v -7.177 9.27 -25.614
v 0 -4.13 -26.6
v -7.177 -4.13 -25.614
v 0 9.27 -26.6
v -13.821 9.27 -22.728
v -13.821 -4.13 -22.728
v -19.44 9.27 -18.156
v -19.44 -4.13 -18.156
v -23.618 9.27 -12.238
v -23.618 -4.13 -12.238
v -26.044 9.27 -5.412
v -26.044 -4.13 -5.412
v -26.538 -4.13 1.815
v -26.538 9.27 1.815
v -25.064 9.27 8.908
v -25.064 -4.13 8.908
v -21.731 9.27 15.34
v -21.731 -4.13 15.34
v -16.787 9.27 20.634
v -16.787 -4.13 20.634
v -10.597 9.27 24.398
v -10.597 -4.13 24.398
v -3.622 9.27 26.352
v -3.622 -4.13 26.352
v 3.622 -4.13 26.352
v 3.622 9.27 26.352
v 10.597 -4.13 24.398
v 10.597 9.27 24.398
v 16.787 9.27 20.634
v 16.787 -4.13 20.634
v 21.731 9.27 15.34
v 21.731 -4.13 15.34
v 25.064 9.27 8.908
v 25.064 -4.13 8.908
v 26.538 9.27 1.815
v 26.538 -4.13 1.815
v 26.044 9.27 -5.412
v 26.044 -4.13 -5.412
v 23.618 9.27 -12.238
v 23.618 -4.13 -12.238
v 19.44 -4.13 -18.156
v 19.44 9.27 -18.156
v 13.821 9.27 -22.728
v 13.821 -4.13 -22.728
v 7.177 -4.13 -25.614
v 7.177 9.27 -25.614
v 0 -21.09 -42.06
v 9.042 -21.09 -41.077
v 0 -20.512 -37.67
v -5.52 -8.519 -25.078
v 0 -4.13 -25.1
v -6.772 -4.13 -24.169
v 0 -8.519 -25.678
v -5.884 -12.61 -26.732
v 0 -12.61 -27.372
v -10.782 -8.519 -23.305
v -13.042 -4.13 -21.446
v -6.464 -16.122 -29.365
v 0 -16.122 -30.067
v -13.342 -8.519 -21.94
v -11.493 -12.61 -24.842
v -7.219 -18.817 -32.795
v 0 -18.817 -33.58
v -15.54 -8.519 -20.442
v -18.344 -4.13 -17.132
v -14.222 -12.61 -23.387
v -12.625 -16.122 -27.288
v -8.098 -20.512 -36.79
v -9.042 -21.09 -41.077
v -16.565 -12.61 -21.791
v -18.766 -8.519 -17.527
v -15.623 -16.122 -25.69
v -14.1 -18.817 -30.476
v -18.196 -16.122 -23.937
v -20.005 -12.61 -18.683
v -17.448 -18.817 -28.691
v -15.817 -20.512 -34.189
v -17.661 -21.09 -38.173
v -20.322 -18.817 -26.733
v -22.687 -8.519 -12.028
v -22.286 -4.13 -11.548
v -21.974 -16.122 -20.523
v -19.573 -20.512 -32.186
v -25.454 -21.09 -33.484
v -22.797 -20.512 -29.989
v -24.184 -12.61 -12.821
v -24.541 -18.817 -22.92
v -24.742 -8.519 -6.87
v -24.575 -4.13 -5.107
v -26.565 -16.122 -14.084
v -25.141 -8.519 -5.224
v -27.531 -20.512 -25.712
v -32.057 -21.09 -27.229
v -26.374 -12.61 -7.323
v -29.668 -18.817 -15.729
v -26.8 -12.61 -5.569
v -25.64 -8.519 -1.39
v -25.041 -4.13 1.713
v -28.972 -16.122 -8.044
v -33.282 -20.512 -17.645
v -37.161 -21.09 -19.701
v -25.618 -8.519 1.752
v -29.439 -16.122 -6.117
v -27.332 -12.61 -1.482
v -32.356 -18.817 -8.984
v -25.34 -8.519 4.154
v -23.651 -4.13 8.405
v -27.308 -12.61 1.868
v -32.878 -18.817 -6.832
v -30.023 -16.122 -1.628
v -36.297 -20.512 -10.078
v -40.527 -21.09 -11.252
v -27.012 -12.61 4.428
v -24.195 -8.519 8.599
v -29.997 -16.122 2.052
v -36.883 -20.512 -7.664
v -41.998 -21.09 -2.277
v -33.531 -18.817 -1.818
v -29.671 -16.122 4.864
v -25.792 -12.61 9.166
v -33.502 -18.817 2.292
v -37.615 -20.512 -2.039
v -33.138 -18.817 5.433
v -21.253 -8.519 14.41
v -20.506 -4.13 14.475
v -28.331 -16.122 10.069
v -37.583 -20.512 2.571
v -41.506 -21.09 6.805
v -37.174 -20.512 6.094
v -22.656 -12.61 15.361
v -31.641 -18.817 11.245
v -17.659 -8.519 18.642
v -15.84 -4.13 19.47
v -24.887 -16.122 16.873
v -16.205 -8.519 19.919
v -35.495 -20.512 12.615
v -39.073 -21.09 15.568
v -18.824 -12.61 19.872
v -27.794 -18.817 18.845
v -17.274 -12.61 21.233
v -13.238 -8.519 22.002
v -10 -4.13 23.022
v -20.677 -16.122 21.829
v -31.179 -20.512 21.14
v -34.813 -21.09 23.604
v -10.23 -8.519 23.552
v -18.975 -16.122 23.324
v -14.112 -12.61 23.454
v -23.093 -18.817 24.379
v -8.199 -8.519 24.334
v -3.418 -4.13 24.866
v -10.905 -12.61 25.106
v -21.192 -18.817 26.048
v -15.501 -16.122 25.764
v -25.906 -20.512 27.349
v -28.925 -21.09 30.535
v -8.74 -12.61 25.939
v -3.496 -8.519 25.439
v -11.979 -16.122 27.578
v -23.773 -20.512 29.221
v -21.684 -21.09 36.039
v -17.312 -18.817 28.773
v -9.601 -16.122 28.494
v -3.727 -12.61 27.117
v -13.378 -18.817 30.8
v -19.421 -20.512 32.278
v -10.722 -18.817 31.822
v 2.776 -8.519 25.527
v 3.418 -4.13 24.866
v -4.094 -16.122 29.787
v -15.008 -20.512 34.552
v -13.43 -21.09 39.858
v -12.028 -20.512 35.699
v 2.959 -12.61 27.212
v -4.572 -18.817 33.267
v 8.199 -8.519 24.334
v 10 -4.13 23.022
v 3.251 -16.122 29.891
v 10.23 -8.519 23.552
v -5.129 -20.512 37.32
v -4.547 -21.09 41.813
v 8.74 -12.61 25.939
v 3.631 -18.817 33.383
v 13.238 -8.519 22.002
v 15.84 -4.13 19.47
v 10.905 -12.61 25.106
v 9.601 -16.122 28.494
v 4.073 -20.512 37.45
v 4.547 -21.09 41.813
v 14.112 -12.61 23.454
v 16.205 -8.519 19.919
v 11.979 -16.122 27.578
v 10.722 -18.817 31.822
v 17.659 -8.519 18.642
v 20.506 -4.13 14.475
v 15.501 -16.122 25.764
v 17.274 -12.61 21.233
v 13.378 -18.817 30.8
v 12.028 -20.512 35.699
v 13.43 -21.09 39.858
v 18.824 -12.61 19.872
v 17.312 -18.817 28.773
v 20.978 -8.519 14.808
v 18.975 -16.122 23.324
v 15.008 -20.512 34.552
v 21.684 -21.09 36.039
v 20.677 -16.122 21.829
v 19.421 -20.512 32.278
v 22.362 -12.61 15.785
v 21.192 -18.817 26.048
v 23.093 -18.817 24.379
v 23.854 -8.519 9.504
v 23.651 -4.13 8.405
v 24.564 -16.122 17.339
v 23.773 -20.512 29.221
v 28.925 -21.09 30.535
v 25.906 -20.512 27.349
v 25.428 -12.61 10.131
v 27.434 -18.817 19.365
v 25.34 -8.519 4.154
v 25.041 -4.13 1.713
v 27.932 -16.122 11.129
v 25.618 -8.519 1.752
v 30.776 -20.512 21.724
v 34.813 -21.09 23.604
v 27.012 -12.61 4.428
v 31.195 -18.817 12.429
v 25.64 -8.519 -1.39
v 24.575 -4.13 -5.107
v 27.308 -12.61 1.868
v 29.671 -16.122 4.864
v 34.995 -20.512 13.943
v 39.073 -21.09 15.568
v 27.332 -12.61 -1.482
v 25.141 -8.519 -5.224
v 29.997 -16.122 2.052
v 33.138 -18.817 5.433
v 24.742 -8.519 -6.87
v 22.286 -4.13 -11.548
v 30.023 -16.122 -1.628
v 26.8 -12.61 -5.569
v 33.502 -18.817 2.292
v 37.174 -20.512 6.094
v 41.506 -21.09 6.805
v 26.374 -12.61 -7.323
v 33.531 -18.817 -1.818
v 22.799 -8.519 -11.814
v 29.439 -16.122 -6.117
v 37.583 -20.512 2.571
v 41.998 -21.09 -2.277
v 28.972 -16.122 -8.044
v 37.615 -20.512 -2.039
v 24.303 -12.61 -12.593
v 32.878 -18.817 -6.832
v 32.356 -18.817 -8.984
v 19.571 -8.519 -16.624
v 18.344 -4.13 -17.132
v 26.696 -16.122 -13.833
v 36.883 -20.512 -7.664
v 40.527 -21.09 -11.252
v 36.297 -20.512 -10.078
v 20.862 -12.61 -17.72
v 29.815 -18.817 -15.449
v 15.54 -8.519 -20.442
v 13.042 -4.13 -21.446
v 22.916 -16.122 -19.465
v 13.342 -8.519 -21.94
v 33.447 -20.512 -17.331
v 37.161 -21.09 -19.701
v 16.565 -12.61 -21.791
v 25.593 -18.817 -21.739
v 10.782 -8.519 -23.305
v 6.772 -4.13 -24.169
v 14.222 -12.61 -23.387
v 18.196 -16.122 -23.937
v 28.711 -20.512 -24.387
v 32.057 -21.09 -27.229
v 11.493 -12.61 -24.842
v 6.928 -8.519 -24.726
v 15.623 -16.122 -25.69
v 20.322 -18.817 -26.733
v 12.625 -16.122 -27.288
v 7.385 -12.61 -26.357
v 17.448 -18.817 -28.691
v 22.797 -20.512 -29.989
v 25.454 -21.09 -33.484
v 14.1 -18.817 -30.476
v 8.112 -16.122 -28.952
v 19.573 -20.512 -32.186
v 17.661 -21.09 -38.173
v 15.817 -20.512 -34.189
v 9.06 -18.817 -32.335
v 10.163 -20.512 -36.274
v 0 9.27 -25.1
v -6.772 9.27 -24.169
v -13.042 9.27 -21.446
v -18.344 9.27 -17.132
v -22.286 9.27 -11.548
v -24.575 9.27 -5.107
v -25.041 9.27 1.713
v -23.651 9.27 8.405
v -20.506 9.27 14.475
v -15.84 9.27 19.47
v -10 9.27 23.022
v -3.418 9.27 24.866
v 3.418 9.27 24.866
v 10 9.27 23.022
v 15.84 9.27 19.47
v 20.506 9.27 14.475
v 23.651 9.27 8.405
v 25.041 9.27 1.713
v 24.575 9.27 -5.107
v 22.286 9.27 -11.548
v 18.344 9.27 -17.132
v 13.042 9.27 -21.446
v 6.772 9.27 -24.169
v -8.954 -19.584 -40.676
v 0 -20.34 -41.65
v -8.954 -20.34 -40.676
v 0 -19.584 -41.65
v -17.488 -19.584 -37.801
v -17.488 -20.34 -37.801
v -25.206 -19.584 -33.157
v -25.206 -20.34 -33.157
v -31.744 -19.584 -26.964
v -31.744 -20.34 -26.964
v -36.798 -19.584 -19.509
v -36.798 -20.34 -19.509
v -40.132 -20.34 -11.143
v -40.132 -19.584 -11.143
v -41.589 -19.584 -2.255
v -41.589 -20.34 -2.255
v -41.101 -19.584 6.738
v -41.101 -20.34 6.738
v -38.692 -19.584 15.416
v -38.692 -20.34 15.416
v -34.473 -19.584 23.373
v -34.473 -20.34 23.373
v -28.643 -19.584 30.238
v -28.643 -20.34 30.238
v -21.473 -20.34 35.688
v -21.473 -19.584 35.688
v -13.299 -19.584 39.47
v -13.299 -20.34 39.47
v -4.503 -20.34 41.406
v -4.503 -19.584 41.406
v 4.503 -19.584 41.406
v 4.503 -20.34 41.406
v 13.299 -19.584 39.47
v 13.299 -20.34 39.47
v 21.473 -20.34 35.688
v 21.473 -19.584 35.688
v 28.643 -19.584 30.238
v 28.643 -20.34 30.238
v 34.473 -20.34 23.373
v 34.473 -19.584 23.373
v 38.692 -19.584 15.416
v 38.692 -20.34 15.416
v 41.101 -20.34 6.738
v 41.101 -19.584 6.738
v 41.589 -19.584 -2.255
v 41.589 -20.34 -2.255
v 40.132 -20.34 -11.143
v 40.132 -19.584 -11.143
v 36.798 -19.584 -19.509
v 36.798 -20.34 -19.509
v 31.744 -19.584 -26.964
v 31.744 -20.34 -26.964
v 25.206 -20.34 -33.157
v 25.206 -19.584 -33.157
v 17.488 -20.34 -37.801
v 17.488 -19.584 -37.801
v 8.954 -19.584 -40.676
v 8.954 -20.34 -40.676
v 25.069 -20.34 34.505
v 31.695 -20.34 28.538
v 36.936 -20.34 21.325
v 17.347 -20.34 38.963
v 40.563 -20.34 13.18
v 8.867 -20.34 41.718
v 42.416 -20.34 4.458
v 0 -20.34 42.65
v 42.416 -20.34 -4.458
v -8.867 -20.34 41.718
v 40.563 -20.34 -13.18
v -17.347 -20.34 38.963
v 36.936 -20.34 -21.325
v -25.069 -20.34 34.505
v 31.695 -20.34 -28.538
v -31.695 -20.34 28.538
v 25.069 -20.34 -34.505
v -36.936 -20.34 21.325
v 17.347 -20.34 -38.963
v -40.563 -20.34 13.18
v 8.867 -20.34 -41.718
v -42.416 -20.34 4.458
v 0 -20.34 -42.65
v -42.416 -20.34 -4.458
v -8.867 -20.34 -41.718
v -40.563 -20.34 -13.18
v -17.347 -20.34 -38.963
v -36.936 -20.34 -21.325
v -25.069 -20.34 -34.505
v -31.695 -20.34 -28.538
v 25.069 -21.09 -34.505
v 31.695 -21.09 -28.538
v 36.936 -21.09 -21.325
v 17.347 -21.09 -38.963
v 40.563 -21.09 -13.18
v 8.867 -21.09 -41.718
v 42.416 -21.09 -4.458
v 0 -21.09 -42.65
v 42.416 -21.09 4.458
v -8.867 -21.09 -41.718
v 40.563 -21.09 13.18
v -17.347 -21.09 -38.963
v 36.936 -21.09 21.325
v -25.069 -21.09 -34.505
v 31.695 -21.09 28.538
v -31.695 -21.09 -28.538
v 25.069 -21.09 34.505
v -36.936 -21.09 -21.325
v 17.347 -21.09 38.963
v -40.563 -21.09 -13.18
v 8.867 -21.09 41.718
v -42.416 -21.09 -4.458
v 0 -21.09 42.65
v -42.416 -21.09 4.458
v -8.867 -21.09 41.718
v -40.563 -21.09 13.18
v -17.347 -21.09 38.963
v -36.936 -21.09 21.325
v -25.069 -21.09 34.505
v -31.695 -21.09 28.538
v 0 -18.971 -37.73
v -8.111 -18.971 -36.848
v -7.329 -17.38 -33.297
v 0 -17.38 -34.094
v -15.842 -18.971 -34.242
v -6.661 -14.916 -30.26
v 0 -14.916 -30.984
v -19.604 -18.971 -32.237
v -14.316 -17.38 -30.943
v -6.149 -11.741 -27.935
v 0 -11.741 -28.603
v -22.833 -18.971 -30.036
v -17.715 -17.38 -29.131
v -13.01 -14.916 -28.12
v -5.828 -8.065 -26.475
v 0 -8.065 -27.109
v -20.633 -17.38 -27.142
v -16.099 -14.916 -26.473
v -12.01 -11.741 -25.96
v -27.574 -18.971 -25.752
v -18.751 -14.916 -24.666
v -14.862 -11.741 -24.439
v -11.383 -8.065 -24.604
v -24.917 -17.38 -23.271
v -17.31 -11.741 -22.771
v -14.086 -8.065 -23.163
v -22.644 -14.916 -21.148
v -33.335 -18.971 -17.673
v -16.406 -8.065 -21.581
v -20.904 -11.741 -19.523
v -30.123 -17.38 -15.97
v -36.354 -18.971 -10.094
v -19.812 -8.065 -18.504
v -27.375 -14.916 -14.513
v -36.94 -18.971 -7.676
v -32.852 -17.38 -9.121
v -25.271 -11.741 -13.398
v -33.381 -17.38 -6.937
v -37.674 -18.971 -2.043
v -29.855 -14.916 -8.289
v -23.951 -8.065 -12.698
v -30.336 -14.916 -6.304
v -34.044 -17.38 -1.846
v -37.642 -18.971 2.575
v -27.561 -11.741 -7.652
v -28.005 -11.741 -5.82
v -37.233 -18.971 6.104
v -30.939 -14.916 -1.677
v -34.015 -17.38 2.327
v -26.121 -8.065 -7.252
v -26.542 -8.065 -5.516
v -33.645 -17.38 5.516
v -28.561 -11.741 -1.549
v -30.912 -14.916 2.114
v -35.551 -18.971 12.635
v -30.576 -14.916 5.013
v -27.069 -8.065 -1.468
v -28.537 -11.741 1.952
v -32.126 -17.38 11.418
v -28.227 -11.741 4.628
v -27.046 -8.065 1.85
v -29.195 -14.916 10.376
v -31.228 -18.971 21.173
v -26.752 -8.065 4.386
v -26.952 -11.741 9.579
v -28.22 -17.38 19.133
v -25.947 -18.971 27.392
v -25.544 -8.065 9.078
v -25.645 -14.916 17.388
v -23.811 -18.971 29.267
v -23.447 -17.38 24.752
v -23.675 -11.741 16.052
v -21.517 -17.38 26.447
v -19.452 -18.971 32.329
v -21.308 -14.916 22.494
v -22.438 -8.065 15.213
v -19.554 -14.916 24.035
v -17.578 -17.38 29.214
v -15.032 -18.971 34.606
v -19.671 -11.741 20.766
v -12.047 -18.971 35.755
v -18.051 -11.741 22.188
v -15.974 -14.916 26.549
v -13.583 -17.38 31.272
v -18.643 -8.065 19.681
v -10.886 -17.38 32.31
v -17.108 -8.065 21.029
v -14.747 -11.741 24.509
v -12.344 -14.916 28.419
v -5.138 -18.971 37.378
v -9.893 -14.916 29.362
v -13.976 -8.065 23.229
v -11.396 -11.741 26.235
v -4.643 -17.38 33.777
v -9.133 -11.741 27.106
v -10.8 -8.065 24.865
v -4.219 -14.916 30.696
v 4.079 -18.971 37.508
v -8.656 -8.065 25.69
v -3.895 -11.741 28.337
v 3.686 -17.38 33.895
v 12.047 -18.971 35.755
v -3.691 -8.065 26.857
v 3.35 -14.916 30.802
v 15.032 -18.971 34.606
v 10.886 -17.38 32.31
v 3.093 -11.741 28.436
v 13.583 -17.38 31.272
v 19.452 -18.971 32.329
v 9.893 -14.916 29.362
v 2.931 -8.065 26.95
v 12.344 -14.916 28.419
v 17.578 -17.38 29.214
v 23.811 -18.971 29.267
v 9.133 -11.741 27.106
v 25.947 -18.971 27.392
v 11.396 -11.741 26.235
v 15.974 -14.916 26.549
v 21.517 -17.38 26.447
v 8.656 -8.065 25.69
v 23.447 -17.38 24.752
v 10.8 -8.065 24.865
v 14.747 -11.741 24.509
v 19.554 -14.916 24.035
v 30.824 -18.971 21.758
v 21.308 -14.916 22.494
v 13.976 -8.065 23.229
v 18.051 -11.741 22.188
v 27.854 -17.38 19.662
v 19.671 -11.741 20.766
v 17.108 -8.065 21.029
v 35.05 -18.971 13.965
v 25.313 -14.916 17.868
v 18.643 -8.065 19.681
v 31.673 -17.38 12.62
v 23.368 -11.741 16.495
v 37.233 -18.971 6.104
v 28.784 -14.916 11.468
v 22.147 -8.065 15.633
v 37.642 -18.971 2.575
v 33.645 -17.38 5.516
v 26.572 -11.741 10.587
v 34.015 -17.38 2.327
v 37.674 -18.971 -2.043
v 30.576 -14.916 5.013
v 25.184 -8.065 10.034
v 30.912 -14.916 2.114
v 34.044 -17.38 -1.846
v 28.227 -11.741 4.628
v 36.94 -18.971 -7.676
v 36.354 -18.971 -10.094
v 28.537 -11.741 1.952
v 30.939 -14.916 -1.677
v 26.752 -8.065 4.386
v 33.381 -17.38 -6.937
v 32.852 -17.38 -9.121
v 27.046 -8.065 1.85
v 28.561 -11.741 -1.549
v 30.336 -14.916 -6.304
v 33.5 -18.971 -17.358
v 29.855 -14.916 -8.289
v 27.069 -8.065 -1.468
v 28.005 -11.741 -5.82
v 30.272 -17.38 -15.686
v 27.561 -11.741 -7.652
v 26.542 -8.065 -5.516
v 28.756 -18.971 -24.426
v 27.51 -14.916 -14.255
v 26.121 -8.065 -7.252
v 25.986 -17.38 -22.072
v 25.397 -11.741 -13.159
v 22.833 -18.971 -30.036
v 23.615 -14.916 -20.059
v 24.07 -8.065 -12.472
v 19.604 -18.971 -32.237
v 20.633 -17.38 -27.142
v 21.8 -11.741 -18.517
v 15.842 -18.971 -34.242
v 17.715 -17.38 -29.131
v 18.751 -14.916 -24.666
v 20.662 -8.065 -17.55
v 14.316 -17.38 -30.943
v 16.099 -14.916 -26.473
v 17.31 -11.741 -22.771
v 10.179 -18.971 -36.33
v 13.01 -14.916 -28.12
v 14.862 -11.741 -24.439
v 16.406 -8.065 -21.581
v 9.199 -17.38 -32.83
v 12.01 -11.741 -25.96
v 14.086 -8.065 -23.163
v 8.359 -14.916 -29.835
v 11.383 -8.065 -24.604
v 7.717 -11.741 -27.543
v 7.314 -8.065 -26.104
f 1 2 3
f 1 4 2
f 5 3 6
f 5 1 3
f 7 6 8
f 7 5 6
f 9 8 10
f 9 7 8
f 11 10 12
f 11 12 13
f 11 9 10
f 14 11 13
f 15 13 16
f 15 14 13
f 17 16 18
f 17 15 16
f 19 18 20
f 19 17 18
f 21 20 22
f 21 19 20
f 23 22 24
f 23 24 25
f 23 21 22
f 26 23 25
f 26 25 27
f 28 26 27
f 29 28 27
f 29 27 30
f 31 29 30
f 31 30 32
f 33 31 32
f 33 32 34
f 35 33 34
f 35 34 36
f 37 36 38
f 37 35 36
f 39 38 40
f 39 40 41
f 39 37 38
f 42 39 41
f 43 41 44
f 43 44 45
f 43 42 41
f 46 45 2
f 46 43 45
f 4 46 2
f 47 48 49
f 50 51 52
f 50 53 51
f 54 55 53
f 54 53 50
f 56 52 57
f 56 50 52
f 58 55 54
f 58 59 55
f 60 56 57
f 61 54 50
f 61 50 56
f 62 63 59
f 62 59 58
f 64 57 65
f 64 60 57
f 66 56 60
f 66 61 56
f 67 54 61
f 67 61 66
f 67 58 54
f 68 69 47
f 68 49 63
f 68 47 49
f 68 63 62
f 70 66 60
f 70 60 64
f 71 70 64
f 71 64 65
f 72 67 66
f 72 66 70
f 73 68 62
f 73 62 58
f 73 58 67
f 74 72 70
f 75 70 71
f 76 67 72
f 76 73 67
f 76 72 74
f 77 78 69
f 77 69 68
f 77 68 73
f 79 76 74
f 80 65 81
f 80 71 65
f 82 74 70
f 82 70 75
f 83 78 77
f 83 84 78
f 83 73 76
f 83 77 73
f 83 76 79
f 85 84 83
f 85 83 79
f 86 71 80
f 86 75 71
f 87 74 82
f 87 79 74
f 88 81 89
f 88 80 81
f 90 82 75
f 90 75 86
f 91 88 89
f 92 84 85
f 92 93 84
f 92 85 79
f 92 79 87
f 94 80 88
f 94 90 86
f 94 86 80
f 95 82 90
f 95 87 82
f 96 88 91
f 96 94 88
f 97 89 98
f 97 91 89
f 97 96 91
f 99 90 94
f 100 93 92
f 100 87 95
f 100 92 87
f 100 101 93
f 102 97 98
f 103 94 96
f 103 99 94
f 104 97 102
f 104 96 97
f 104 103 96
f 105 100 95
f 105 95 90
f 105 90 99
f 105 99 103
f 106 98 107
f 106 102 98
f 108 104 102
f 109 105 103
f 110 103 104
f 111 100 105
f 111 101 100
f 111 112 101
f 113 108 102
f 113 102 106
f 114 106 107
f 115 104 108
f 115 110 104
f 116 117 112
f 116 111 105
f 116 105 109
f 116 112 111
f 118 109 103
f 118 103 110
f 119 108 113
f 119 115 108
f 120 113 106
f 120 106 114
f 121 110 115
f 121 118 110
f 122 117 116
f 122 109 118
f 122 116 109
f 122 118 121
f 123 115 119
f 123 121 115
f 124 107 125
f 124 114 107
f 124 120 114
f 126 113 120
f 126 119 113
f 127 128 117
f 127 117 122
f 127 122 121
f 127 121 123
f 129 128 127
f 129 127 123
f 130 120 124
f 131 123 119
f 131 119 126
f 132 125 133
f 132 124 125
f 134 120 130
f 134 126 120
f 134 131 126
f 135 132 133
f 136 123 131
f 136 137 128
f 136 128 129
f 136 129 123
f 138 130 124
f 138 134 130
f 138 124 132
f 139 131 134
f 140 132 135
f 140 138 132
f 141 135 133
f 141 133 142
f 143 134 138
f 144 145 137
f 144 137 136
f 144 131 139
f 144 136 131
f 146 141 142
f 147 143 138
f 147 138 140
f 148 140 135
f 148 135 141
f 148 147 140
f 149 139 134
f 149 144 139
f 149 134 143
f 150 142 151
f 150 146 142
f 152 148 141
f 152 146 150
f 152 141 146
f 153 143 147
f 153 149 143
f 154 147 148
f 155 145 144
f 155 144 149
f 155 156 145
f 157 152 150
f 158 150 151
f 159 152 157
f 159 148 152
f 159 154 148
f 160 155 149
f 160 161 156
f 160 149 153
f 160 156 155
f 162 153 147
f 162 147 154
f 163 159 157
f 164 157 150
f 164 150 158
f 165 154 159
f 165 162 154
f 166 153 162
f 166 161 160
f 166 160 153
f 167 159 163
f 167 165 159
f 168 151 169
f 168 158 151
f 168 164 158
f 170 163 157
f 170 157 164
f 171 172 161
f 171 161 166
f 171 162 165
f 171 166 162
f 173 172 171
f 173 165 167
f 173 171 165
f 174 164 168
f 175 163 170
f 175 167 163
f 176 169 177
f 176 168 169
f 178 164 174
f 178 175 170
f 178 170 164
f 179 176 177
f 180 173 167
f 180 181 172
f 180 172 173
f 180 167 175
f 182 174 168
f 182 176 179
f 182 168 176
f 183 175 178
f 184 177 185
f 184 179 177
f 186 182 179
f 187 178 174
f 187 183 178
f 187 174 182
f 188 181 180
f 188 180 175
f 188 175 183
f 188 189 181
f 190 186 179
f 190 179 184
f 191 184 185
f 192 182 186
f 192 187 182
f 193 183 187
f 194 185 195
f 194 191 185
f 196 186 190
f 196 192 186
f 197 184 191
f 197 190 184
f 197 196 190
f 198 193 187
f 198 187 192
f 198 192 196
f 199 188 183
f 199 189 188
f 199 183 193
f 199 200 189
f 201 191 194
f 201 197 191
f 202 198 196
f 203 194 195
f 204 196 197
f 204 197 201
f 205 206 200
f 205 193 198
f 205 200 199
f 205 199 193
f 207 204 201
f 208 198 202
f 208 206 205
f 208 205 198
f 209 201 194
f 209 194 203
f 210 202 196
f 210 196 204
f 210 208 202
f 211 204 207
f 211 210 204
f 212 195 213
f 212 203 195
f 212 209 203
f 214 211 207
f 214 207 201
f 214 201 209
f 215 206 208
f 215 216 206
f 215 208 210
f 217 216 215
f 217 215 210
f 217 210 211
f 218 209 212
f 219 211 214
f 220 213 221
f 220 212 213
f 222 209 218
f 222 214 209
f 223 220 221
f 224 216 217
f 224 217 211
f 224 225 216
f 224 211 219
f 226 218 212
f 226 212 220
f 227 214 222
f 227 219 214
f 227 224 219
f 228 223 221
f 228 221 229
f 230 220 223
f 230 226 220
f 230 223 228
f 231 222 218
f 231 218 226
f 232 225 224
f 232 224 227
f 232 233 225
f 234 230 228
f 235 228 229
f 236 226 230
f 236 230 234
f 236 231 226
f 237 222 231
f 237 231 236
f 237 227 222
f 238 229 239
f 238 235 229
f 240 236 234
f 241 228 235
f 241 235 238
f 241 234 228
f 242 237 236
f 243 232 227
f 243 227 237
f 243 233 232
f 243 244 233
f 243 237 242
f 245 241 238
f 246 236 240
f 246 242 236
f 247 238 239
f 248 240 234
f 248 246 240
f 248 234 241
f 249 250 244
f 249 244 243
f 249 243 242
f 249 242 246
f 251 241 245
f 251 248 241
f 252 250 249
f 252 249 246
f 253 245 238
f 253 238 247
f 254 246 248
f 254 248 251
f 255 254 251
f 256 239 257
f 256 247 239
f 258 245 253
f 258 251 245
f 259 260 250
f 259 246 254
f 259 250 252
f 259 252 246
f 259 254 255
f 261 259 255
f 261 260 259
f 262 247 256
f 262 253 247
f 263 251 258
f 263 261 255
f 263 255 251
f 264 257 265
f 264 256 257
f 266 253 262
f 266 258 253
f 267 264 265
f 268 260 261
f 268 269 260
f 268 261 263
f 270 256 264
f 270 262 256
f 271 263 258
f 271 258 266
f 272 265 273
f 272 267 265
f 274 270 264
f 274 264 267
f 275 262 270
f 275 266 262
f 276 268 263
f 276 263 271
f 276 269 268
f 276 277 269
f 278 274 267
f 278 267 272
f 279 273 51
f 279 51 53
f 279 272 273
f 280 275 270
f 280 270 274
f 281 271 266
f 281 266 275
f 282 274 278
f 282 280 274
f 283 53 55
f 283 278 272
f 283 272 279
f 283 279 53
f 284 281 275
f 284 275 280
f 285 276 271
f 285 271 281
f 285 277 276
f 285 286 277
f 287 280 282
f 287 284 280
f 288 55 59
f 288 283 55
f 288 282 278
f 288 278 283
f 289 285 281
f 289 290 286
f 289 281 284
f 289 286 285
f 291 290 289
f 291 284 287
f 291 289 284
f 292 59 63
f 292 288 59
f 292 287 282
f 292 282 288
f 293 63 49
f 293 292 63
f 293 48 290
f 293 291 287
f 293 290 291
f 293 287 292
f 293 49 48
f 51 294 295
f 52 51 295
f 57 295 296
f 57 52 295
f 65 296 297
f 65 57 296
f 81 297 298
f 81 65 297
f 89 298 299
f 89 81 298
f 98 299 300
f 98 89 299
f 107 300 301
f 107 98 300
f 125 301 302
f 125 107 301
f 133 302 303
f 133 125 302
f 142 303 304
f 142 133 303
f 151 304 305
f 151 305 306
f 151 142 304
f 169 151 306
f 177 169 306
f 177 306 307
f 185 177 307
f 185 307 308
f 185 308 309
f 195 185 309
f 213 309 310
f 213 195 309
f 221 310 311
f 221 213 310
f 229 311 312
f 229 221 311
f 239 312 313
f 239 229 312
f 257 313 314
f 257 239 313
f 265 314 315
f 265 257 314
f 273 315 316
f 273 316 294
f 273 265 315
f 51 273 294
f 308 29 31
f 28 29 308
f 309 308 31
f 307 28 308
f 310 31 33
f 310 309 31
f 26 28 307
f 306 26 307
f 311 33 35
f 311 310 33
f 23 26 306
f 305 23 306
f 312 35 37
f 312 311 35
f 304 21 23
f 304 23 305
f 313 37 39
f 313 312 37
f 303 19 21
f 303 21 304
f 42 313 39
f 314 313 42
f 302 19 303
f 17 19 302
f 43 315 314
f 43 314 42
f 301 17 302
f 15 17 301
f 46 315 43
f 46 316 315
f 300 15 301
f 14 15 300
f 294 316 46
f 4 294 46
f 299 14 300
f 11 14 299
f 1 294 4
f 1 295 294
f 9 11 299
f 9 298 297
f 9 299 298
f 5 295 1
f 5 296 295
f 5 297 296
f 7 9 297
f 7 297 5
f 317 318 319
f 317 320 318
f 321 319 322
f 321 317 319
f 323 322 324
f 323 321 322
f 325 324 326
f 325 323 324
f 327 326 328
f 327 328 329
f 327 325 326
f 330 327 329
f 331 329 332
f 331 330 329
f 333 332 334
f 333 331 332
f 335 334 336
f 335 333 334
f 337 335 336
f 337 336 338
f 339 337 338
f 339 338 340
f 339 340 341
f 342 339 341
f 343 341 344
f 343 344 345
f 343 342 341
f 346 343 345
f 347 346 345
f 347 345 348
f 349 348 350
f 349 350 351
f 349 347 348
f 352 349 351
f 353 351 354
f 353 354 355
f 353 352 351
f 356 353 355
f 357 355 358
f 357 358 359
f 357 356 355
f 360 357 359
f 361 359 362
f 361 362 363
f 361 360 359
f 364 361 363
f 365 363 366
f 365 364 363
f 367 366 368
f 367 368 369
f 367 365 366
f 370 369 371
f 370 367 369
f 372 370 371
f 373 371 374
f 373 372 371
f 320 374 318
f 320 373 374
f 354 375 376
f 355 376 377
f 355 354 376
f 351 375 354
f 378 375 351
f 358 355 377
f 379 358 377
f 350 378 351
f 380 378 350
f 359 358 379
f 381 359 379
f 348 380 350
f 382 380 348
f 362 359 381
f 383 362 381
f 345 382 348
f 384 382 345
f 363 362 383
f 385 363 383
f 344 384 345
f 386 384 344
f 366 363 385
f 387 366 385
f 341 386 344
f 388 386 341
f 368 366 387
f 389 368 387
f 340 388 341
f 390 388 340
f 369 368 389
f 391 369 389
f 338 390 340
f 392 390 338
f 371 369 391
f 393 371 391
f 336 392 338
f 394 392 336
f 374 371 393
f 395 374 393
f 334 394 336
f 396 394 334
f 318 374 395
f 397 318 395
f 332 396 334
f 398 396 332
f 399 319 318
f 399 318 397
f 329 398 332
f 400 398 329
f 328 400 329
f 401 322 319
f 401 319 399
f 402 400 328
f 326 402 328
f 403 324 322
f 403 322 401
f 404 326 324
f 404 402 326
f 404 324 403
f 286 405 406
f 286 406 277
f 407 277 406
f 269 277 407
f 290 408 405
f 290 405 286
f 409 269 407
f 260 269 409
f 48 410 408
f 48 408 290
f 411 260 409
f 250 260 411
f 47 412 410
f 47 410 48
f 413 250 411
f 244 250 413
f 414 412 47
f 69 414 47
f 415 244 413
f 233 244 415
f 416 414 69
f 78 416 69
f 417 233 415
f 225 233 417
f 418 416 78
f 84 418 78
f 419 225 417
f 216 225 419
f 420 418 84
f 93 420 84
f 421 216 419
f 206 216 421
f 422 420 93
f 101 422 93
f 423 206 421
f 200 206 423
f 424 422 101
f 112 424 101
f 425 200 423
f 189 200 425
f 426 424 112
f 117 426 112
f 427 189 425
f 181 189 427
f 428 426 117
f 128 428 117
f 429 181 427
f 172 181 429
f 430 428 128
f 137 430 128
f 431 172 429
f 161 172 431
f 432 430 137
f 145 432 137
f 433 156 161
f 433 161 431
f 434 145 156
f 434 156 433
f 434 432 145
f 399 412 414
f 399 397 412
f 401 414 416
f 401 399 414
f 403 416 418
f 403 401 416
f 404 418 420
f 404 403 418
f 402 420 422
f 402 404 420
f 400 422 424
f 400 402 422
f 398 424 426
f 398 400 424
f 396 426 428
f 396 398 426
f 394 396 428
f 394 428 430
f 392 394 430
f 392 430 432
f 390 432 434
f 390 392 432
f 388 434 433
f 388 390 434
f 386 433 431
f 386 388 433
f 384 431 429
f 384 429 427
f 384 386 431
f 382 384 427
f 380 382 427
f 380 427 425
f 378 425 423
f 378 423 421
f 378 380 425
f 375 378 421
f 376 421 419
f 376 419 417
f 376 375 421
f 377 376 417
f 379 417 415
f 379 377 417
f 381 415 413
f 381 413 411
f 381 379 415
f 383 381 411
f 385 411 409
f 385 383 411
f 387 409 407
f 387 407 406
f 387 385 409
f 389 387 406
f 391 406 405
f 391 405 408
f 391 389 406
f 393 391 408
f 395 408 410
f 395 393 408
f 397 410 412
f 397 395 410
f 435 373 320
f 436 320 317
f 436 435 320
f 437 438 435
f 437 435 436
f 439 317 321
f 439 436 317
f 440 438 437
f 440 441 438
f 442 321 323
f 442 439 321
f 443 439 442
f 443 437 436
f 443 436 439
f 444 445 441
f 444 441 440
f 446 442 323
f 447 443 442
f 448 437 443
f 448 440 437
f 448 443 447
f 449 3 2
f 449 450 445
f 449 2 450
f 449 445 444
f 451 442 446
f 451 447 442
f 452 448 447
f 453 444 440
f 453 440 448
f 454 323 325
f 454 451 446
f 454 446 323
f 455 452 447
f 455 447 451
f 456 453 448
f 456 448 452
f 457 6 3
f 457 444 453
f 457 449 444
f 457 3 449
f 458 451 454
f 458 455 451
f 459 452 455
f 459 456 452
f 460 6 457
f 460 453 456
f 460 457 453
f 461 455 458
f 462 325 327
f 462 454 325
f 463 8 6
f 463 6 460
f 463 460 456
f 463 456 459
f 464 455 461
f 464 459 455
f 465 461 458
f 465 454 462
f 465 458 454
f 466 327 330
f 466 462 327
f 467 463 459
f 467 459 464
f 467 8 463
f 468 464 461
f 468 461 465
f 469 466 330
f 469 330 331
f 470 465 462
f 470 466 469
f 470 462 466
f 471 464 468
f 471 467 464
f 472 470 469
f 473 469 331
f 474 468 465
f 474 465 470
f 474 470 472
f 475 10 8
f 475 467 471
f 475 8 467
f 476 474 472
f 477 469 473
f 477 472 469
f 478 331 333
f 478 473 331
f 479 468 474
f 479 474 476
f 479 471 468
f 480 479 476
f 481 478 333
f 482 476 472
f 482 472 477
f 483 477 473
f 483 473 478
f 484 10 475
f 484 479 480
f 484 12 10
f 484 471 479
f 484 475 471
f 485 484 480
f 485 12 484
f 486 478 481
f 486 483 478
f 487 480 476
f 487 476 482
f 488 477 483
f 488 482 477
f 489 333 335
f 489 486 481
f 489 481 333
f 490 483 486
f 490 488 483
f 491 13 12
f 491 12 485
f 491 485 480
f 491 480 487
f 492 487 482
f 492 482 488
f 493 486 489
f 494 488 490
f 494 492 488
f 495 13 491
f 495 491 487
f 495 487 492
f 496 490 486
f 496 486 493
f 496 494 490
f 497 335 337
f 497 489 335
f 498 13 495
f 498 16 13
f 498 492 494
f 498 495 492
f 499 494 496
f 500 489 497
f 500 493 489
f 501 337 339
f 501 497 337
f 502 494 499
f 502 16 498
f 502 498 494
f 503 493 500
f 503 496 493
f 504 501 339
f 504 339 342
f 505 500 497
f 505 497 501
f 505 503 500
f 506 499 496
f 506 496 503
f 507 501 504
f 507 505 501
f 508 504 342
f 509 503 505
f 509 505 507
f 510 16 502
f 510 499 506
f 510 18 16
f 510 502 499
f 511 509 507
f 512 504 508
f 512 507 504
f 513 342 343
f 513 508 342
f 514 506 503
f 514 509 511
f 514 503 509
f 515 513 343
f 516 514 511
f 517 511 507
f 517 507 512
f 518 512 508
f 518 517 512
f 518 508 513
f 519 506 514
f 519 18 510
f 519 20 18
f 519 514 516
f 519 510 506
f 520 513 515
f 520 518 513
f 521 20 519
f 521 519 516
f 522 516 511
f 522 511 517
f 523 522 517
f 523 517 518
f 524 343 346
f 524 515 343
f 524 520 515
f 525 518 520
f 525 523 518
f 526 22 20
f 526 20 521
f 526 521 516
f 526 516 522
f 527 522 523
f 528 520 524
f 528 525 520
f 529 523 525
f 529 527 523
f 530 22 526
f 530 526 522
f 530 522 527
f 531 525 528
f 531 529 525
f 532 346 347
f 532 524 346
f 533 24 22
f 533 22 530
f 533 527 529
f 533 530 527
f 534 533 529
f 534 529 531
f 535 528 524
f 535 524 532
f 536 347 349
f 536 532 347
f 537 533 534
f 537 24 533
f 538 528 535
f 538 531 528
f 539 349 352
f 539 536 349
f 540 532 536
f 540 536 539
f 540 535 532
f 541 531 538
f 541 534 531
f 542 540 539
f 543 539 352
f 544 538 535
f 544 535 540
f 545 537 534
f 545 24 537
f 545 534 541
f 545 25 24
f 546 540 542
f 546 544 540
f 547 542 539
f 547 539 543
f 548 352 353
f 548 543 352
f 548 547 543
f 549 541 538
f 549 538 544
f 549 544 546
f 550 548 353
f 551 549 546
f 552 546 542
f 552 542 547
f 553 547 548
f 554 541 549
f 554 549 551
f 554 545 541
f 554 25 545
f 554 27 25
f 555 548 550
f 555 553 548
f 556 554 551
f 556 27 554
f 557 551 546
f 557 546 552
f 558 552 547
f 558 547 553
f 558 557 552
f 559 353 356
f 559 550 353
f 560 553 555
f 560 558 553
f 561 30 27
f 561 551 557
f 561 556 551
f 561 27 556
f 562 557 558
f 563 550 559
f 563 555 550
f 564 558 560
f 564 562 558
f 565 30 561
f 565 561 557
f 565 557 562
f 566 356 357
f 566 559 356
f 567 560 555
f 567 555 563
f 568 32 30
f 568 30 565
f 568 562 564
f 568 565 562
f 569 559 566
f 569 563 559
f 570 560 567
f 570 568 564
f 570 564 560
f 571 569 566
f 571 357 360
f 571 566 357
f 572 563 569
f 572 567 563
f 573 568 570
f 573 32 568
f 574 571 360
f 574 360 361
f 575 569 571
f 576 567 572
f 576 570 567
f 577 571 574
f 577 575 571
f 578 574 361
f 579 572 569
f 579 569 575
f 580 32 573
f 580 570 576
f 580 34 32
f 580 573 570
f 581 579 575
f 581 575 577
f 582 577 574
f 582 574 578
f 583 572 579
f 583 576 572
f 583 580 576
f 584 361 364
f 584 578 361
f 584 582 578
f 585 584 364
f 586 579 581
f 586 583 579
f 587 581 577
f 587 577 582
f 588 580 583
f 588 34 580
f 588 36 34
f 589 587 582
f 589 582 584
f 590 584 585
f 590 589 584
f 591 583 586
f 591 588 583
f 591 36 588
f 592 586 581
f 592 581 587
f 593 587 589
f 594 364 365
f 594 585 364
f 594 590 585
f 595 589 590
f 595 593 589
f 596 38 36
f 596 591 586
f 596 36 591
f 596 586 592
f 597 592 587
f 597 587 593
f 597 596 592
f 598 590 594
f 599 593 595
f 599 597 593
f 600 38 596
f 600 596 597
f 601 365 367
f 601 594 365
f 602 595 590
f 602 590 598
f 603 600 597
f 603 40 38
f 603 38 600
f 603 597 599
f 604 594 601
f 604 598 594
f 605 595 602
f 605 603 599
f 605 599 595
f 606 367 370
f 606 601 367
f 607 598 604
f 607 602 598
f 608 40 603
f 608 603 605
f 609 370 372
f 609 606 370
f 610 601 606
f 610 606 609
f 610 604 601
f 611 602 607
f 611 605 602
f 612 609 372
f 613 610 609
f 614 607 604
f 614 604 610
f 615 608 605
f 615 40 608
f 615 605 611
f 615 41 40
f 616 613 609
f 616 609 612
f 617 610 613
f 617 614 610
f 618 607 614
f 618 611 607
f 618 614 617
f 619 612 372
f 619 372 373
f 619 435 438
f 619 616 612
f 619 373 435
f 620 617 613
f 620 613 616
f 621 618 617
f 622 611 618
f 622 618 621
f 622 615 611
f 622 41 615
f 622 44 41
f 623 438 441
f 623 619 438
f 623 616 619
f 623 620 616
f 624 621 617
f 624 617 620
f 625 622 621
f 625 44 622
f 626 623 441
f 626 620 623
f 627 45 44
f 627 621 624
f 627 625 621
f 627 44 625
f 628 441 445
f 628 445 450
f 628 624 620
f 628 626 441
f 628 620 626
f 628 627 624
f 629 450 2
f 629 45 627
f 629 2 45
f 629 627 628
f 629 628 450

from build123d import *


with BuildPart() as part:
    # Çizim1 → Döndür1 (revolve)
    with BuildSketch(Plane.XY, mode=Mode.PRIVATE) as d_nd_r1_sk:
        with BuildLine():
            Line((-25.1, 9.270415491), (-25.1, -4.129584509))
            ThreePointArc((-25.1, -4.129584509), (-30.067468991, -16.122115518), (-42.06, -21.089584509))
            Line((-42.06, -21.089584509), (-42.65, -21.089584509))
            Line((-42.65, -21.089584509), (-42.65, -20.339584509))
            Line((-42.65, -20.339584509), (-42.06, -20.339584509))
            Line((-42.06, -20.339584509), (-41.65, -20.339584509))
            Line((-41.65, -20.339584509), (-41.65, -19.584146943))
            ThreePointArc((-41.65, -19.584146943), (-30.984120802, -14.915524431), (-26.6, -4.129584509))
            Line((-26.6, -4.129584509), (-26.6, 9.270415491))
            Line((-26.6, 9.270415491), (-25.1, 9.270415491))
        make_face()
    revolve(d_nd_r1_sk.sketch.rotate(Axis((0, 0, 0), (0, 1, 0)), 270), axis=Axis((0, 0, 0), (0, 1, 0)))


solid = part.part
